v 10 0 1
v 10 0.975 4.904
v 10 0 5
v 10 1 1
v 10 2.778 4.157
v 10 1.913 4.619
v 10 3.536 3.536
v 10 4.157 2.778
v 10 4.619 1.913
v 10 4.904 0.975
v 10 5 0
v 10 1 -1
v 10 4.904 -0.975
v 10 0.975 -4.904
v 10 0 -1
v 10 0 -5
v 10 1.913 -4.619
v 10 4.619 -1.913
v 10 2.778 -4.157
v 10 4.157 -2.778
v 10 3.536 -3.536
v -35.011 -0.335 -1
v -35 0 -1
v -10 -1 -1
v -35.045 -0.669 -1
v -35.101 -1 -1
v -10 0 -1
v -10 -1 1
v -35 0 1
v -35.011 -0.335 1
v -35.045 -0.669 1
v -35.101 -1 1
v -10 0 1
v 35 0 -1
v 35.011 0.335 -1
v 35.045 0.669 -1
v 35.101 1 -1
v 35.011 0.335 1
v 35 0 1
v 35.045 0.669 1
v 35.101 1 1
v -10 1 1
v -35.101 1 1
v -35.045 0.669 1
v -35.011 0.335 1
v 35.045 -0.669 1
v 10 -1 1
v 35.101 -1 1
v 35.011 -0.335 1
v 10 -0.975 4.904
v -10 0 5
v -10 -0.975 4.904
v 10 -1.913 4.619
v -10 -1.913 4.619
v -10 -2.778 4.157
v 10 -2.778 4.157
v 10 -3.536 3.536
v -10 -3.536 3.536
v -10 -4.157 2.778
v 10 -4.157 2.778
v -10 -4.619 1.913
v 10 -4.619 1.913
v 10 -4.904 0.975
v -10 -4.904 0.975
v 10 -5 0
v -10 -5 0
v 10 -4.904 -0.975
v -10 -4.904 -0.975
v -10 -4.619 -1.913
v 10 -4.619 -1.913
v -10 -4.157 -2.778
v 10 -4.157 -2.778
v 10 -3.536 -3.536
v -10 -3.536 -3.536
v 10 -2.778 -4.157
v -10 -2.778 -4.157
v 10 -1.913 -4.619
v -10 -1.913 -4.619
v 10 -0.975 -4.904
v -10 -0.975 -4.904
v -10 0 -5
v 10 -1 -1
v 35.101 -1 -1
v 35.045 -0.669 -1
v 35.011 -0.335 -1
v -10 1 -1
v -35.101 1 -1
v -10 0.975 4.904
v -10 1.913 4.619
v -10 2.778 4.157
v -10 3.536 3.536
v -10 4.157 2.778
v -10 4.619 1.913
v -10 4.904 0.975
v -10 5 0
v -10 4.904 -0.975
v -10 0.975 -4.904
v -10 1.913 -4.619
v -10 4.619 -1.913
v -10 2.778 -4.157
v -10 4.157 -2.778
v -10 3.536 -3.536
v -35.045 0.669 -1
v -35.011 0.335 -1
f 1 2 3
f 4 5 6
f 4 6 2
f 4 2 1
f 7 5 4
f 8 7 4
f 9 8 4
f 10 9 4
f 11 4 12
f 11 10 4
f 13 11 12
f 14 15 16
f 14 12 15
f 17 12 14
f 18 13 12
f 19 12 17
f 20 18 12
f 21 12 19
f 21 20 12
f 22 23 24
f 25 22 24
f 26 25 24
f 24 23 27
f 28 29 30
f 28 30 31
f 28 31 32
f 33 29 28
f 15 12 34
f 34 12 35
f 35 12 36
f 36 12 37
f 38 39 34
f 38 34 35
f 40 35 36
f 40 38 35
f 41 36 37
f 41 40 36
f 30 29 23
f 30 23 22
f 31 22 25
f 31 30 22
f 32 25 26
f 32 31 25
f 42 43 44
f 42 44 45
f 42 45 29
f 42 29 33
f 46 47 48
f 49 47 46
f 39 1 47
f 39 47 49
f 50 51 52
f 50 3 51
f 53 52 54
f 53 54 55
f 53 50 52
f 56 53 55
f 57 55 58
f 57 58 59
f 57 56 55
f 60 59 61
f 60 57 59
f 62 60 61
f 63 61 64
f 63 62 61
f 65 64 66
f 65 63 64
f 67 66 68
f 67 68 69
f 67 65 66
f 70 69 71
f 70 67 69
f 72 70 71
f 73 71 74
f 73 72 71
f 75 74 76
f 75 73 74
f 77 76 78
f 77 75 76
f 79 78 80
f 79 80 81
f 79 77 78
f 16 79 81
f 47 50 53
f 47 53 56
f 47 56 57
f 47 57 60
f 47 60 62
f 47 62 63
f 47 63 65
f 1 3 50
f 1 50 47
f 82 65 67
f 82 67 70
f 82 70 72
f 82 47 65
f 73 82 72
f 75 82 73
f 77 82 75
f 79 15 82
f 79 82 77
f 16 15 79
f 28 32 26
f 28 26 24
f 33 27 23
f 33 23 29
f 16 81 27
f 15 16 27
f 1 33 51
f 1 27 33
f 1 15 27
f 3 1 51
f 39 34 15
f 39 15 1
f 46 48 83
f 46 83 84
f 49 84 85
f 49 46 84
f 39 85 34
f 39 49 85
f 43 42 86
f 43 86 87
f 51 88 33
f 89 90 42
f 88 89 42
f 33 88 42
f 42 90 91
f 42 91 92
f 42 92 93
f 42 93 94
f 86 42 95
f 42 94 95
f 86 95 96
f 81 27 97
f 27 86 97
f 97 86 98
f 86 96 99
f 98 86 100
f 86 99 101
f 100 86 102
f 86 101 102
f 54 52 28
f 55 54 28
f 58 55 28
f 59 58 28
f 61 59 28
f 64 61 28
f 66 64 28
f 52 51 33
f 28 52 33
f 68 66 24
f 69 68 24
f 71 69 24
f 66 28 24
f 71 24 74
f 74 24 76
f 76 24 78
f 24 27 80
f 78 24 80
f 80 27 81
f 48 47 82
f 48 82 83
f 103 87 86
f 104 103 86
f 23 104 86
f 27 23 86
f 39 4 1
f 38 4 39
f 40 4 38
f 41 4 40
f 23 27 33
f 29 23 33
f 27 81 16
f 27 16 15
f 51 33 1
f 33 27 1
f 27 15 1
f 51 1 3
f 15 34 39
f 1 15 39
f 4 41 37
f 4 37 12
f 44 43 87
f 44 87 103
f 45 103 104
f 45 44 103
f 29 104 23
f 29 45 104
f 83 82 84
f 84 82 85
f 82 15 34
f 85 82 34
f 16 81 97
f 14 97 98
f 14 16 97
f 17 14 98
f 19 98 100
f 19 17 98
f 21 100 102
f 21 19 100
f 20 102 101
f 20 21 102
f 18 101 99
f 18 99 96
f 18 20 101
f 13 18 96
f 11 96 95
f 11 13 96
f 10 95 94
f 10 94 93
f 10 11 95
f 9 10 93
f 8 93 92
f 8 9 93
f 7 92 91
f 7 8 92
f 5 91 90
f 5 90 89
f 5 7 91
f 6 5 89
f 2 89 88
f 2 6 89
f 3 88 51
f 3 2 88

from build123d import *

# Parameters (mm, degrees)
SKETCH1_R           = 5
BOSS_EXTRUDE1_DEPTH = 10
BOSS_EXTRUDE5_DEPTH = 1


with BuildPart() as part:
    # Sketch1 → Boss-Extrude1 (new, symmetric)
    with BuildSketch(Plane(origin=(0, 0, 0), x_dir=(0, 0, -1), z_dir=(1, 0, 0))):
        Circle(SKETCH1_R)
    extrude(amount=BOSS_EXTRUDE1_DEPTH, both=True)

    # Sketch5 → Boss-Extrude5 (add, symmetric)
    with BuildSketch(Plane.XY):
        with BuildLine():
            Line((35.101020514, 1), (-35.101020514, 1))
            ThreePointArc((-35.101020514, 1), (-35.025319235, 0.50254481), (-35, 0))
            ThreePointArc((-35, 0), (-35.025319235, -0.50254481), (-35.101020514, -1))
            Line((-35.101020514, -1), (35.101020514, -1))
            ThreePointArc((35.101020514, -1), (35, 0), (35.101020514, 1))
        make_face()
    extrude(amount=BOSS_EXTRUDE5_DEPTH, both=True)


with BuildPart() as body_2:
    # Split1: the piece on the far side of the plane
    add(part.part)
    split(bisect_by=Plane.ZX, keep=Keep.BOTTOM)


with BuildPart() as part_1:
    add(part.part)

    # Split1
    split(bisect_by=Plane.ZX, keep=Keep.TOP)


solid = Compound([body_2.part, part_1.part])
